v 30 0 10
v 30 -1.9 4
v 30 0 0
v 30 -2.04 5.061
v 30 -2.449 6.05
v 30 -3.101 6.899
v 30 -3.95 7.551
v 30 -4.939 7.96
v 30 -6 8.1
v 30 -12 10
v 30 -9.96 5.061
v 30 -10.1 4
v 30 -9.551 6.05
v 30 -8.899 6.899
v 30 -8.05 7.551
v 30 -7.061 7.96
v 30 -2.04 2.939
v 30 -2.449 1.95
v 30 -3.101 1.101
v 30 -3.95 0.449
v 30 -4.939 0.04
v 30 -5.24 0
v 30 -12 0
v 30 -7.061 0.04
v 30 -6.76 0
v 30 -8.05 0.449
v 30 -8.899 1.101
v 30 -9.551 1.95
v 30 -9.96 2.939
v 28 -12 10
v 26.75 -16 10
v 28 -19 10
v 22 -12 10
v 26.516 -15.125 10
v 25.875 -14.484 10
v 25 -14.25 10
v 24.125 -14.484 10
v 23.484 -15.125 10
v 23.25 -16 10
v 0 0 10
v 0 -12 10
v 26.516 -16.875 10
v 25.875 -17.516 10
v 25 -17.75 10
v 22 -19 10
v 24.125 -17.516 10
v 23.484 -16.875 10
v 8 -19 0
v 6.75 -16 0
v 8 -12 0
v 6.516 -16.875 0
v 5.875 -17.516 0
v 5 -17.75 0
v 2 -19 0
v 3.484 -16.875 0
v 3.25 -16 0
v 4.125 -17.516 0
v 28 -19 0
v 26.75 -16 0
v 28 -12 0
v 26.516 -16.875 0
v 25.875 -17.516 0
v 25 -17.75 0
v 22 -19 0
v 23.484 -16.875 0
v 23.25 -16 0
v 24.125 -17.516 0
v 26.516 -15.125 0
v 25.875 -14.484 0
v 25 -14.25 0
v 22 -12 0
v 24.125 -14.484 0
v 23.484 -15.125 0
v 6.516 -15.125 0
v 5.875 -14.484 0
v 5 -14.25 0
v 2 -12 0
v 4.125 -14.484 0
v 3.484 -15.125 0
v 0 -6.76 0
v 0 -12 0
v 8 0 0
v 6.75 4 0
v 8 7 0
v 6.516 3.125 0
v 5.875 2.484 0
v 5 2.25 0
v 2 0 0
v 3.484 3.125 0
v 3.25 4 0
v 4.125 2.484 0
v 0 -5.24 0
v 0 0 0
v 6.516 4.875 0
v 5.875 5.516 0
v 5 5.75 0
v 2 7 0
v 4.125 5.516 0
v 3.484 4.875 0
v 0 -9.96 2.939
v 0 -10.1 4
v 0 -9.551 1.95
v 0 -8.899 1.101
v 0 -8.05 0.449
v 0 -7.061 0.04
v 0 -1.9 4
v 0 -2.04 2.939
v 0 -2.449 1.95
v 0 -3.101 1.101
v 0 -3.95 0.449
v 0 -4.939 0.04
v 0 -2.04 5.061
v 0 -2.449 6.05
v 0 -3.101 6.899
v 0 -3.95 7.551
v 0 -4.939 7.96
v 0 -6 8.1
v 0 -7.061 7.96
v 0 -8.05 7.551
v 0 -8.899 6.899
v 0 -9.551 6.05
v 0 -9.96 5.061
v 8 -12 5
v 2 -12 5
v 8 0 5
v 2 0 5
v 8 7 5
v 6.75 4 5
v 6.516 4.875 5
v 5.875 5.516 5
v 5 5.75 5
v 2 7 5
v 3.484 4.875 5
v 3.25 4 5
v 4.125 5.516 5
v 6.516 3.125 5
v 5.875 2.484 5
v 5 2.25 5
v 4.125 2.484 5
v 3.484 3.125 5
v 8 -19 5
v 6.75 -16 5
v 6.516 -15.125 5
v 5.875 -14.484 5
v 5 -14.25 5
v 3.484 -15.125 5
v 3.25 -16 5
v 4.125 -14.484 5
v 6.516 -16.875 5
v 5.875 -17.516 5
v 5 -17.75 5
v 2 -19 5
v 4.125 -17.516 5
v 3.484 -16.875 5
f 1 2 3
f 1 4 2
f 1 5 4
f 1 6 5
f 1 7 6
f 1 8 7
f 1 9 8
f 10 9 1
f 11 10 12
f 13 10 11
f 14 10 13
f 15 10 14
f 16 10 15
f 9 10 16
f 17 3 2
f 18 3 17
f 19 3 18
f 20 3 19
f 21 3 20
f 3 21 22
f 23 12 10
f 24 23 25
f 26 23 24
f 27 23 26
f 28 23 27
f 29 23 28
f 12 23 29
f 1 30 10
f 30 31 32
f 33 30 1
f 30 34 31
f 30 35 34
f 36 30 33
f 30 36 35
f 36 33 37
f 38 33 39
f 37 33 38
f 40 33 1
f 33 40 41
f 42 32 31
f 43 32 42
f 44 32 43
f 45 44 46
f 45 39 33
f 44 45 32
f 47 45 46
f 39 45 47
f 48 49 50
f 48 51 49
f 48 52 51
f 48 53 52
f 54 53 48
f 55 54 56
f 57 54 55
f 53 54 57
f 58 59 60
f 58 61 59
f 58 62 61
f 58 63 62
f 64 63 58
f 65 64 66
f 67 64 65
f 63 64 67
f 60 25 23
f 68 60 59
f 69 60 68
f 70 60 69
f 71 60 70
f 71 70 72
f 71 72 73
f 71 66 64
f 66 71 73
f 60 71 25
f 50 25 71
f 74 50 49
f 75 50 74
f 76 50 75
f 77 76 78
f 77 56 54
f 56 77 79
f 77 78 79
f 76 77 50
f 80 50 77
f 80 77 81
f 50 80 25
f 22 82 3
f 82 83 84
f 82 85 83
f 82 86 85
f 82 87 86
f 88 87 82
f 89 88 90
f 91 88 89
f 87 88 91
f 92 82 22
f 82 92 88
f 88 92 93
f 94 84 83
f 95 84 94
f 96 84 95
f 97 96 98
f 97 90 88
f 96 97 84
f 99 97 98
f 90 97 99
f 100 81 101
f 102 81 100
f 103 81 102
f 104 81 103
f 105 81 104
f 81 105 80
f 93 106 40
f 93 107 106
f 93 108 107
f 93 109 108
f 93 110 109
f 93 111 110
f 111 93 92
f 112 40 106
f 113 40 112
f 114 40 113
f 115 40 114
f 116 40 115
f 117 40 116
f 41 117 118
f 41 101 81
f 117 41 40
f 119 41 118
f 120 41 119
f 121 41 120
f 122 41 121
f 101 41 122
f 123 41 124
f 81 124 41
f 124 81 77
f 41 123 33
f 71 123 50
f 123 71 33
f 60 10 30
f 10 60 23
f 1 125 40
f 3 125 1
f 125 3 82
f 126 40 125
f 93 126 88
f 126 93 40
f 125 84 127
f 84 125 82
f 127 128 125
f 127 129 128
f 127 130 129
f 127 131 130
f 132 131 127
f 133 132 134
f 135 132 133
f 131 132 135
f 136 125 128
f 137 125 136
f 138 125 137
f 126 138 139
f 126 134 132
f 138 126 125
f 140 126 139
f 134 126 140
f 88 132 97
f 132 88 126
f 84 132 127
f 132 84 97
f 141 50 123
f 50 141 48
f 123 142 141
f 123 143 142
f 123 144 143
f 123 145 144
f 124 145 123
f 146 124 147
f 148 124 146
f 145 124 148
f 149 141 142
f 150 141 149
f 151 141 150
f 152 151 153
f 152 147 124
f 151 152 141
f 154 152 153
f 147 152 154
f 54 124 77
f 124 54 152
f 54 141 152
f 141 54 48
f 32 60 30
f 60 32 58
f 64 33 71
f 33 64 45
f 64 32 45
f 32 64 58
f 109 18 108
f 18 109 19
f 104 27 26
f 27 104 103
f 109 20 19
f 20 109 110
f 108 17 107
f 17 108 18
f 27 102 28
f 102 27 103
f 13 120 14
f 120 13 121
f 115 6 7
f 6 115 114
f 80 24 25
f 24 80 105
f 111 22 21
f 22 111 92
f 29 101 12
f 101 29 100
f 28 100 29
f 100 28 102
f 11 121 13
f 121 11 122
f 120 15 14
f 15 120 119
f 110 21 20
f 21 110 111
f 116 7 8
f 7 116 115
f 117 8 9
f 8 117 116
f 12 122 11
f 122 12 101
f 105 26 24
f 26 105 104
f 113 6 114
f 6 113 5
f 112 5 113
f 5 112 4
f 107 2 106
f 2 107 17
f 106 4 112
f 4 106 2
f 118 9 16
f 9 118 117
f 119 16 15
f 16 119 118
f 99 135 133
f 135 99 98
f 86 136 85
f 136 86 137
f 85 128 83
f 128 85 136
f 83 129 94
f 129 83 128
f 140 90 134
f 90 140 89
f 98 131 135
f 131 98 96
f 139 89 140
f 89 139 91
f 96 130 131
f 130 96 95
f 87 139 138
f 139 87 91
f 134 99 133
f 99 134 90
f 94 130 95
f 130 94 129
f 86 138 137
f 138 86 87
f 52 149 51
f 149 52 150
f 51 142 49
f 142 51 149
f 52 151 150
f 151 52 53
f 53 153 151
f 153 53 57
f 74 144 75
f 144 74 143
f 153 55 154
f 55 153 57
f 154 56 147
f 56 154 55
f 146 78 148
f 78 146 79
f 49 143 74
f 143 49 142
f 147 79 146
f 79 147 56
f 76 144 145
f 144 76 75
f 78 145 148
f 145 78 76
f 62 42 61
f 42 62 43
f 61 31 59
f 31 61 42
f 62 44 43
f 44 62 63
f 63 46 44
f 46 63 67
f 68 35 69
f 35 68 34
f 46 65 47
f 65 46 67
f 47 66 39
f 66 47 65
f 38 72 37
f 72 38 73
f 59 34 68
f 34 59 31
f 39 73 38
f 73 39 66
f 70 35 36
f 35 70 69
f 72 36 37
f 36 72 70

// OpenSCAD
mirror([0,1,0])
difference()
{
    union()
    {
        cube([30,12,10]);
        
        translate([2,-4-3,0])
            cube([6,8,5]);
            //cylinder(d=3.5,h=4,$fn=12);
        translate([2,11,0])
            cube([6,8,5]);
        translate([2+20,11,0])
            cube([6,8,10]);
    }
    union()
    {
        translate([0,6,4])
            rotate([0,90,0])
                cylinder(d=8.2,h=30,$fn=24);
        
        translate([5,-4,0])
            cylinder(d=3.5,h=10,$fn=12);
        translate([5,6+6+4,0])
            cylinder(d=3.5,h=10,$fn=12);
        translate([5+20,6+6+4,0])
            cylinder(d=3.5,h=10,$fn=12);
    }
}
